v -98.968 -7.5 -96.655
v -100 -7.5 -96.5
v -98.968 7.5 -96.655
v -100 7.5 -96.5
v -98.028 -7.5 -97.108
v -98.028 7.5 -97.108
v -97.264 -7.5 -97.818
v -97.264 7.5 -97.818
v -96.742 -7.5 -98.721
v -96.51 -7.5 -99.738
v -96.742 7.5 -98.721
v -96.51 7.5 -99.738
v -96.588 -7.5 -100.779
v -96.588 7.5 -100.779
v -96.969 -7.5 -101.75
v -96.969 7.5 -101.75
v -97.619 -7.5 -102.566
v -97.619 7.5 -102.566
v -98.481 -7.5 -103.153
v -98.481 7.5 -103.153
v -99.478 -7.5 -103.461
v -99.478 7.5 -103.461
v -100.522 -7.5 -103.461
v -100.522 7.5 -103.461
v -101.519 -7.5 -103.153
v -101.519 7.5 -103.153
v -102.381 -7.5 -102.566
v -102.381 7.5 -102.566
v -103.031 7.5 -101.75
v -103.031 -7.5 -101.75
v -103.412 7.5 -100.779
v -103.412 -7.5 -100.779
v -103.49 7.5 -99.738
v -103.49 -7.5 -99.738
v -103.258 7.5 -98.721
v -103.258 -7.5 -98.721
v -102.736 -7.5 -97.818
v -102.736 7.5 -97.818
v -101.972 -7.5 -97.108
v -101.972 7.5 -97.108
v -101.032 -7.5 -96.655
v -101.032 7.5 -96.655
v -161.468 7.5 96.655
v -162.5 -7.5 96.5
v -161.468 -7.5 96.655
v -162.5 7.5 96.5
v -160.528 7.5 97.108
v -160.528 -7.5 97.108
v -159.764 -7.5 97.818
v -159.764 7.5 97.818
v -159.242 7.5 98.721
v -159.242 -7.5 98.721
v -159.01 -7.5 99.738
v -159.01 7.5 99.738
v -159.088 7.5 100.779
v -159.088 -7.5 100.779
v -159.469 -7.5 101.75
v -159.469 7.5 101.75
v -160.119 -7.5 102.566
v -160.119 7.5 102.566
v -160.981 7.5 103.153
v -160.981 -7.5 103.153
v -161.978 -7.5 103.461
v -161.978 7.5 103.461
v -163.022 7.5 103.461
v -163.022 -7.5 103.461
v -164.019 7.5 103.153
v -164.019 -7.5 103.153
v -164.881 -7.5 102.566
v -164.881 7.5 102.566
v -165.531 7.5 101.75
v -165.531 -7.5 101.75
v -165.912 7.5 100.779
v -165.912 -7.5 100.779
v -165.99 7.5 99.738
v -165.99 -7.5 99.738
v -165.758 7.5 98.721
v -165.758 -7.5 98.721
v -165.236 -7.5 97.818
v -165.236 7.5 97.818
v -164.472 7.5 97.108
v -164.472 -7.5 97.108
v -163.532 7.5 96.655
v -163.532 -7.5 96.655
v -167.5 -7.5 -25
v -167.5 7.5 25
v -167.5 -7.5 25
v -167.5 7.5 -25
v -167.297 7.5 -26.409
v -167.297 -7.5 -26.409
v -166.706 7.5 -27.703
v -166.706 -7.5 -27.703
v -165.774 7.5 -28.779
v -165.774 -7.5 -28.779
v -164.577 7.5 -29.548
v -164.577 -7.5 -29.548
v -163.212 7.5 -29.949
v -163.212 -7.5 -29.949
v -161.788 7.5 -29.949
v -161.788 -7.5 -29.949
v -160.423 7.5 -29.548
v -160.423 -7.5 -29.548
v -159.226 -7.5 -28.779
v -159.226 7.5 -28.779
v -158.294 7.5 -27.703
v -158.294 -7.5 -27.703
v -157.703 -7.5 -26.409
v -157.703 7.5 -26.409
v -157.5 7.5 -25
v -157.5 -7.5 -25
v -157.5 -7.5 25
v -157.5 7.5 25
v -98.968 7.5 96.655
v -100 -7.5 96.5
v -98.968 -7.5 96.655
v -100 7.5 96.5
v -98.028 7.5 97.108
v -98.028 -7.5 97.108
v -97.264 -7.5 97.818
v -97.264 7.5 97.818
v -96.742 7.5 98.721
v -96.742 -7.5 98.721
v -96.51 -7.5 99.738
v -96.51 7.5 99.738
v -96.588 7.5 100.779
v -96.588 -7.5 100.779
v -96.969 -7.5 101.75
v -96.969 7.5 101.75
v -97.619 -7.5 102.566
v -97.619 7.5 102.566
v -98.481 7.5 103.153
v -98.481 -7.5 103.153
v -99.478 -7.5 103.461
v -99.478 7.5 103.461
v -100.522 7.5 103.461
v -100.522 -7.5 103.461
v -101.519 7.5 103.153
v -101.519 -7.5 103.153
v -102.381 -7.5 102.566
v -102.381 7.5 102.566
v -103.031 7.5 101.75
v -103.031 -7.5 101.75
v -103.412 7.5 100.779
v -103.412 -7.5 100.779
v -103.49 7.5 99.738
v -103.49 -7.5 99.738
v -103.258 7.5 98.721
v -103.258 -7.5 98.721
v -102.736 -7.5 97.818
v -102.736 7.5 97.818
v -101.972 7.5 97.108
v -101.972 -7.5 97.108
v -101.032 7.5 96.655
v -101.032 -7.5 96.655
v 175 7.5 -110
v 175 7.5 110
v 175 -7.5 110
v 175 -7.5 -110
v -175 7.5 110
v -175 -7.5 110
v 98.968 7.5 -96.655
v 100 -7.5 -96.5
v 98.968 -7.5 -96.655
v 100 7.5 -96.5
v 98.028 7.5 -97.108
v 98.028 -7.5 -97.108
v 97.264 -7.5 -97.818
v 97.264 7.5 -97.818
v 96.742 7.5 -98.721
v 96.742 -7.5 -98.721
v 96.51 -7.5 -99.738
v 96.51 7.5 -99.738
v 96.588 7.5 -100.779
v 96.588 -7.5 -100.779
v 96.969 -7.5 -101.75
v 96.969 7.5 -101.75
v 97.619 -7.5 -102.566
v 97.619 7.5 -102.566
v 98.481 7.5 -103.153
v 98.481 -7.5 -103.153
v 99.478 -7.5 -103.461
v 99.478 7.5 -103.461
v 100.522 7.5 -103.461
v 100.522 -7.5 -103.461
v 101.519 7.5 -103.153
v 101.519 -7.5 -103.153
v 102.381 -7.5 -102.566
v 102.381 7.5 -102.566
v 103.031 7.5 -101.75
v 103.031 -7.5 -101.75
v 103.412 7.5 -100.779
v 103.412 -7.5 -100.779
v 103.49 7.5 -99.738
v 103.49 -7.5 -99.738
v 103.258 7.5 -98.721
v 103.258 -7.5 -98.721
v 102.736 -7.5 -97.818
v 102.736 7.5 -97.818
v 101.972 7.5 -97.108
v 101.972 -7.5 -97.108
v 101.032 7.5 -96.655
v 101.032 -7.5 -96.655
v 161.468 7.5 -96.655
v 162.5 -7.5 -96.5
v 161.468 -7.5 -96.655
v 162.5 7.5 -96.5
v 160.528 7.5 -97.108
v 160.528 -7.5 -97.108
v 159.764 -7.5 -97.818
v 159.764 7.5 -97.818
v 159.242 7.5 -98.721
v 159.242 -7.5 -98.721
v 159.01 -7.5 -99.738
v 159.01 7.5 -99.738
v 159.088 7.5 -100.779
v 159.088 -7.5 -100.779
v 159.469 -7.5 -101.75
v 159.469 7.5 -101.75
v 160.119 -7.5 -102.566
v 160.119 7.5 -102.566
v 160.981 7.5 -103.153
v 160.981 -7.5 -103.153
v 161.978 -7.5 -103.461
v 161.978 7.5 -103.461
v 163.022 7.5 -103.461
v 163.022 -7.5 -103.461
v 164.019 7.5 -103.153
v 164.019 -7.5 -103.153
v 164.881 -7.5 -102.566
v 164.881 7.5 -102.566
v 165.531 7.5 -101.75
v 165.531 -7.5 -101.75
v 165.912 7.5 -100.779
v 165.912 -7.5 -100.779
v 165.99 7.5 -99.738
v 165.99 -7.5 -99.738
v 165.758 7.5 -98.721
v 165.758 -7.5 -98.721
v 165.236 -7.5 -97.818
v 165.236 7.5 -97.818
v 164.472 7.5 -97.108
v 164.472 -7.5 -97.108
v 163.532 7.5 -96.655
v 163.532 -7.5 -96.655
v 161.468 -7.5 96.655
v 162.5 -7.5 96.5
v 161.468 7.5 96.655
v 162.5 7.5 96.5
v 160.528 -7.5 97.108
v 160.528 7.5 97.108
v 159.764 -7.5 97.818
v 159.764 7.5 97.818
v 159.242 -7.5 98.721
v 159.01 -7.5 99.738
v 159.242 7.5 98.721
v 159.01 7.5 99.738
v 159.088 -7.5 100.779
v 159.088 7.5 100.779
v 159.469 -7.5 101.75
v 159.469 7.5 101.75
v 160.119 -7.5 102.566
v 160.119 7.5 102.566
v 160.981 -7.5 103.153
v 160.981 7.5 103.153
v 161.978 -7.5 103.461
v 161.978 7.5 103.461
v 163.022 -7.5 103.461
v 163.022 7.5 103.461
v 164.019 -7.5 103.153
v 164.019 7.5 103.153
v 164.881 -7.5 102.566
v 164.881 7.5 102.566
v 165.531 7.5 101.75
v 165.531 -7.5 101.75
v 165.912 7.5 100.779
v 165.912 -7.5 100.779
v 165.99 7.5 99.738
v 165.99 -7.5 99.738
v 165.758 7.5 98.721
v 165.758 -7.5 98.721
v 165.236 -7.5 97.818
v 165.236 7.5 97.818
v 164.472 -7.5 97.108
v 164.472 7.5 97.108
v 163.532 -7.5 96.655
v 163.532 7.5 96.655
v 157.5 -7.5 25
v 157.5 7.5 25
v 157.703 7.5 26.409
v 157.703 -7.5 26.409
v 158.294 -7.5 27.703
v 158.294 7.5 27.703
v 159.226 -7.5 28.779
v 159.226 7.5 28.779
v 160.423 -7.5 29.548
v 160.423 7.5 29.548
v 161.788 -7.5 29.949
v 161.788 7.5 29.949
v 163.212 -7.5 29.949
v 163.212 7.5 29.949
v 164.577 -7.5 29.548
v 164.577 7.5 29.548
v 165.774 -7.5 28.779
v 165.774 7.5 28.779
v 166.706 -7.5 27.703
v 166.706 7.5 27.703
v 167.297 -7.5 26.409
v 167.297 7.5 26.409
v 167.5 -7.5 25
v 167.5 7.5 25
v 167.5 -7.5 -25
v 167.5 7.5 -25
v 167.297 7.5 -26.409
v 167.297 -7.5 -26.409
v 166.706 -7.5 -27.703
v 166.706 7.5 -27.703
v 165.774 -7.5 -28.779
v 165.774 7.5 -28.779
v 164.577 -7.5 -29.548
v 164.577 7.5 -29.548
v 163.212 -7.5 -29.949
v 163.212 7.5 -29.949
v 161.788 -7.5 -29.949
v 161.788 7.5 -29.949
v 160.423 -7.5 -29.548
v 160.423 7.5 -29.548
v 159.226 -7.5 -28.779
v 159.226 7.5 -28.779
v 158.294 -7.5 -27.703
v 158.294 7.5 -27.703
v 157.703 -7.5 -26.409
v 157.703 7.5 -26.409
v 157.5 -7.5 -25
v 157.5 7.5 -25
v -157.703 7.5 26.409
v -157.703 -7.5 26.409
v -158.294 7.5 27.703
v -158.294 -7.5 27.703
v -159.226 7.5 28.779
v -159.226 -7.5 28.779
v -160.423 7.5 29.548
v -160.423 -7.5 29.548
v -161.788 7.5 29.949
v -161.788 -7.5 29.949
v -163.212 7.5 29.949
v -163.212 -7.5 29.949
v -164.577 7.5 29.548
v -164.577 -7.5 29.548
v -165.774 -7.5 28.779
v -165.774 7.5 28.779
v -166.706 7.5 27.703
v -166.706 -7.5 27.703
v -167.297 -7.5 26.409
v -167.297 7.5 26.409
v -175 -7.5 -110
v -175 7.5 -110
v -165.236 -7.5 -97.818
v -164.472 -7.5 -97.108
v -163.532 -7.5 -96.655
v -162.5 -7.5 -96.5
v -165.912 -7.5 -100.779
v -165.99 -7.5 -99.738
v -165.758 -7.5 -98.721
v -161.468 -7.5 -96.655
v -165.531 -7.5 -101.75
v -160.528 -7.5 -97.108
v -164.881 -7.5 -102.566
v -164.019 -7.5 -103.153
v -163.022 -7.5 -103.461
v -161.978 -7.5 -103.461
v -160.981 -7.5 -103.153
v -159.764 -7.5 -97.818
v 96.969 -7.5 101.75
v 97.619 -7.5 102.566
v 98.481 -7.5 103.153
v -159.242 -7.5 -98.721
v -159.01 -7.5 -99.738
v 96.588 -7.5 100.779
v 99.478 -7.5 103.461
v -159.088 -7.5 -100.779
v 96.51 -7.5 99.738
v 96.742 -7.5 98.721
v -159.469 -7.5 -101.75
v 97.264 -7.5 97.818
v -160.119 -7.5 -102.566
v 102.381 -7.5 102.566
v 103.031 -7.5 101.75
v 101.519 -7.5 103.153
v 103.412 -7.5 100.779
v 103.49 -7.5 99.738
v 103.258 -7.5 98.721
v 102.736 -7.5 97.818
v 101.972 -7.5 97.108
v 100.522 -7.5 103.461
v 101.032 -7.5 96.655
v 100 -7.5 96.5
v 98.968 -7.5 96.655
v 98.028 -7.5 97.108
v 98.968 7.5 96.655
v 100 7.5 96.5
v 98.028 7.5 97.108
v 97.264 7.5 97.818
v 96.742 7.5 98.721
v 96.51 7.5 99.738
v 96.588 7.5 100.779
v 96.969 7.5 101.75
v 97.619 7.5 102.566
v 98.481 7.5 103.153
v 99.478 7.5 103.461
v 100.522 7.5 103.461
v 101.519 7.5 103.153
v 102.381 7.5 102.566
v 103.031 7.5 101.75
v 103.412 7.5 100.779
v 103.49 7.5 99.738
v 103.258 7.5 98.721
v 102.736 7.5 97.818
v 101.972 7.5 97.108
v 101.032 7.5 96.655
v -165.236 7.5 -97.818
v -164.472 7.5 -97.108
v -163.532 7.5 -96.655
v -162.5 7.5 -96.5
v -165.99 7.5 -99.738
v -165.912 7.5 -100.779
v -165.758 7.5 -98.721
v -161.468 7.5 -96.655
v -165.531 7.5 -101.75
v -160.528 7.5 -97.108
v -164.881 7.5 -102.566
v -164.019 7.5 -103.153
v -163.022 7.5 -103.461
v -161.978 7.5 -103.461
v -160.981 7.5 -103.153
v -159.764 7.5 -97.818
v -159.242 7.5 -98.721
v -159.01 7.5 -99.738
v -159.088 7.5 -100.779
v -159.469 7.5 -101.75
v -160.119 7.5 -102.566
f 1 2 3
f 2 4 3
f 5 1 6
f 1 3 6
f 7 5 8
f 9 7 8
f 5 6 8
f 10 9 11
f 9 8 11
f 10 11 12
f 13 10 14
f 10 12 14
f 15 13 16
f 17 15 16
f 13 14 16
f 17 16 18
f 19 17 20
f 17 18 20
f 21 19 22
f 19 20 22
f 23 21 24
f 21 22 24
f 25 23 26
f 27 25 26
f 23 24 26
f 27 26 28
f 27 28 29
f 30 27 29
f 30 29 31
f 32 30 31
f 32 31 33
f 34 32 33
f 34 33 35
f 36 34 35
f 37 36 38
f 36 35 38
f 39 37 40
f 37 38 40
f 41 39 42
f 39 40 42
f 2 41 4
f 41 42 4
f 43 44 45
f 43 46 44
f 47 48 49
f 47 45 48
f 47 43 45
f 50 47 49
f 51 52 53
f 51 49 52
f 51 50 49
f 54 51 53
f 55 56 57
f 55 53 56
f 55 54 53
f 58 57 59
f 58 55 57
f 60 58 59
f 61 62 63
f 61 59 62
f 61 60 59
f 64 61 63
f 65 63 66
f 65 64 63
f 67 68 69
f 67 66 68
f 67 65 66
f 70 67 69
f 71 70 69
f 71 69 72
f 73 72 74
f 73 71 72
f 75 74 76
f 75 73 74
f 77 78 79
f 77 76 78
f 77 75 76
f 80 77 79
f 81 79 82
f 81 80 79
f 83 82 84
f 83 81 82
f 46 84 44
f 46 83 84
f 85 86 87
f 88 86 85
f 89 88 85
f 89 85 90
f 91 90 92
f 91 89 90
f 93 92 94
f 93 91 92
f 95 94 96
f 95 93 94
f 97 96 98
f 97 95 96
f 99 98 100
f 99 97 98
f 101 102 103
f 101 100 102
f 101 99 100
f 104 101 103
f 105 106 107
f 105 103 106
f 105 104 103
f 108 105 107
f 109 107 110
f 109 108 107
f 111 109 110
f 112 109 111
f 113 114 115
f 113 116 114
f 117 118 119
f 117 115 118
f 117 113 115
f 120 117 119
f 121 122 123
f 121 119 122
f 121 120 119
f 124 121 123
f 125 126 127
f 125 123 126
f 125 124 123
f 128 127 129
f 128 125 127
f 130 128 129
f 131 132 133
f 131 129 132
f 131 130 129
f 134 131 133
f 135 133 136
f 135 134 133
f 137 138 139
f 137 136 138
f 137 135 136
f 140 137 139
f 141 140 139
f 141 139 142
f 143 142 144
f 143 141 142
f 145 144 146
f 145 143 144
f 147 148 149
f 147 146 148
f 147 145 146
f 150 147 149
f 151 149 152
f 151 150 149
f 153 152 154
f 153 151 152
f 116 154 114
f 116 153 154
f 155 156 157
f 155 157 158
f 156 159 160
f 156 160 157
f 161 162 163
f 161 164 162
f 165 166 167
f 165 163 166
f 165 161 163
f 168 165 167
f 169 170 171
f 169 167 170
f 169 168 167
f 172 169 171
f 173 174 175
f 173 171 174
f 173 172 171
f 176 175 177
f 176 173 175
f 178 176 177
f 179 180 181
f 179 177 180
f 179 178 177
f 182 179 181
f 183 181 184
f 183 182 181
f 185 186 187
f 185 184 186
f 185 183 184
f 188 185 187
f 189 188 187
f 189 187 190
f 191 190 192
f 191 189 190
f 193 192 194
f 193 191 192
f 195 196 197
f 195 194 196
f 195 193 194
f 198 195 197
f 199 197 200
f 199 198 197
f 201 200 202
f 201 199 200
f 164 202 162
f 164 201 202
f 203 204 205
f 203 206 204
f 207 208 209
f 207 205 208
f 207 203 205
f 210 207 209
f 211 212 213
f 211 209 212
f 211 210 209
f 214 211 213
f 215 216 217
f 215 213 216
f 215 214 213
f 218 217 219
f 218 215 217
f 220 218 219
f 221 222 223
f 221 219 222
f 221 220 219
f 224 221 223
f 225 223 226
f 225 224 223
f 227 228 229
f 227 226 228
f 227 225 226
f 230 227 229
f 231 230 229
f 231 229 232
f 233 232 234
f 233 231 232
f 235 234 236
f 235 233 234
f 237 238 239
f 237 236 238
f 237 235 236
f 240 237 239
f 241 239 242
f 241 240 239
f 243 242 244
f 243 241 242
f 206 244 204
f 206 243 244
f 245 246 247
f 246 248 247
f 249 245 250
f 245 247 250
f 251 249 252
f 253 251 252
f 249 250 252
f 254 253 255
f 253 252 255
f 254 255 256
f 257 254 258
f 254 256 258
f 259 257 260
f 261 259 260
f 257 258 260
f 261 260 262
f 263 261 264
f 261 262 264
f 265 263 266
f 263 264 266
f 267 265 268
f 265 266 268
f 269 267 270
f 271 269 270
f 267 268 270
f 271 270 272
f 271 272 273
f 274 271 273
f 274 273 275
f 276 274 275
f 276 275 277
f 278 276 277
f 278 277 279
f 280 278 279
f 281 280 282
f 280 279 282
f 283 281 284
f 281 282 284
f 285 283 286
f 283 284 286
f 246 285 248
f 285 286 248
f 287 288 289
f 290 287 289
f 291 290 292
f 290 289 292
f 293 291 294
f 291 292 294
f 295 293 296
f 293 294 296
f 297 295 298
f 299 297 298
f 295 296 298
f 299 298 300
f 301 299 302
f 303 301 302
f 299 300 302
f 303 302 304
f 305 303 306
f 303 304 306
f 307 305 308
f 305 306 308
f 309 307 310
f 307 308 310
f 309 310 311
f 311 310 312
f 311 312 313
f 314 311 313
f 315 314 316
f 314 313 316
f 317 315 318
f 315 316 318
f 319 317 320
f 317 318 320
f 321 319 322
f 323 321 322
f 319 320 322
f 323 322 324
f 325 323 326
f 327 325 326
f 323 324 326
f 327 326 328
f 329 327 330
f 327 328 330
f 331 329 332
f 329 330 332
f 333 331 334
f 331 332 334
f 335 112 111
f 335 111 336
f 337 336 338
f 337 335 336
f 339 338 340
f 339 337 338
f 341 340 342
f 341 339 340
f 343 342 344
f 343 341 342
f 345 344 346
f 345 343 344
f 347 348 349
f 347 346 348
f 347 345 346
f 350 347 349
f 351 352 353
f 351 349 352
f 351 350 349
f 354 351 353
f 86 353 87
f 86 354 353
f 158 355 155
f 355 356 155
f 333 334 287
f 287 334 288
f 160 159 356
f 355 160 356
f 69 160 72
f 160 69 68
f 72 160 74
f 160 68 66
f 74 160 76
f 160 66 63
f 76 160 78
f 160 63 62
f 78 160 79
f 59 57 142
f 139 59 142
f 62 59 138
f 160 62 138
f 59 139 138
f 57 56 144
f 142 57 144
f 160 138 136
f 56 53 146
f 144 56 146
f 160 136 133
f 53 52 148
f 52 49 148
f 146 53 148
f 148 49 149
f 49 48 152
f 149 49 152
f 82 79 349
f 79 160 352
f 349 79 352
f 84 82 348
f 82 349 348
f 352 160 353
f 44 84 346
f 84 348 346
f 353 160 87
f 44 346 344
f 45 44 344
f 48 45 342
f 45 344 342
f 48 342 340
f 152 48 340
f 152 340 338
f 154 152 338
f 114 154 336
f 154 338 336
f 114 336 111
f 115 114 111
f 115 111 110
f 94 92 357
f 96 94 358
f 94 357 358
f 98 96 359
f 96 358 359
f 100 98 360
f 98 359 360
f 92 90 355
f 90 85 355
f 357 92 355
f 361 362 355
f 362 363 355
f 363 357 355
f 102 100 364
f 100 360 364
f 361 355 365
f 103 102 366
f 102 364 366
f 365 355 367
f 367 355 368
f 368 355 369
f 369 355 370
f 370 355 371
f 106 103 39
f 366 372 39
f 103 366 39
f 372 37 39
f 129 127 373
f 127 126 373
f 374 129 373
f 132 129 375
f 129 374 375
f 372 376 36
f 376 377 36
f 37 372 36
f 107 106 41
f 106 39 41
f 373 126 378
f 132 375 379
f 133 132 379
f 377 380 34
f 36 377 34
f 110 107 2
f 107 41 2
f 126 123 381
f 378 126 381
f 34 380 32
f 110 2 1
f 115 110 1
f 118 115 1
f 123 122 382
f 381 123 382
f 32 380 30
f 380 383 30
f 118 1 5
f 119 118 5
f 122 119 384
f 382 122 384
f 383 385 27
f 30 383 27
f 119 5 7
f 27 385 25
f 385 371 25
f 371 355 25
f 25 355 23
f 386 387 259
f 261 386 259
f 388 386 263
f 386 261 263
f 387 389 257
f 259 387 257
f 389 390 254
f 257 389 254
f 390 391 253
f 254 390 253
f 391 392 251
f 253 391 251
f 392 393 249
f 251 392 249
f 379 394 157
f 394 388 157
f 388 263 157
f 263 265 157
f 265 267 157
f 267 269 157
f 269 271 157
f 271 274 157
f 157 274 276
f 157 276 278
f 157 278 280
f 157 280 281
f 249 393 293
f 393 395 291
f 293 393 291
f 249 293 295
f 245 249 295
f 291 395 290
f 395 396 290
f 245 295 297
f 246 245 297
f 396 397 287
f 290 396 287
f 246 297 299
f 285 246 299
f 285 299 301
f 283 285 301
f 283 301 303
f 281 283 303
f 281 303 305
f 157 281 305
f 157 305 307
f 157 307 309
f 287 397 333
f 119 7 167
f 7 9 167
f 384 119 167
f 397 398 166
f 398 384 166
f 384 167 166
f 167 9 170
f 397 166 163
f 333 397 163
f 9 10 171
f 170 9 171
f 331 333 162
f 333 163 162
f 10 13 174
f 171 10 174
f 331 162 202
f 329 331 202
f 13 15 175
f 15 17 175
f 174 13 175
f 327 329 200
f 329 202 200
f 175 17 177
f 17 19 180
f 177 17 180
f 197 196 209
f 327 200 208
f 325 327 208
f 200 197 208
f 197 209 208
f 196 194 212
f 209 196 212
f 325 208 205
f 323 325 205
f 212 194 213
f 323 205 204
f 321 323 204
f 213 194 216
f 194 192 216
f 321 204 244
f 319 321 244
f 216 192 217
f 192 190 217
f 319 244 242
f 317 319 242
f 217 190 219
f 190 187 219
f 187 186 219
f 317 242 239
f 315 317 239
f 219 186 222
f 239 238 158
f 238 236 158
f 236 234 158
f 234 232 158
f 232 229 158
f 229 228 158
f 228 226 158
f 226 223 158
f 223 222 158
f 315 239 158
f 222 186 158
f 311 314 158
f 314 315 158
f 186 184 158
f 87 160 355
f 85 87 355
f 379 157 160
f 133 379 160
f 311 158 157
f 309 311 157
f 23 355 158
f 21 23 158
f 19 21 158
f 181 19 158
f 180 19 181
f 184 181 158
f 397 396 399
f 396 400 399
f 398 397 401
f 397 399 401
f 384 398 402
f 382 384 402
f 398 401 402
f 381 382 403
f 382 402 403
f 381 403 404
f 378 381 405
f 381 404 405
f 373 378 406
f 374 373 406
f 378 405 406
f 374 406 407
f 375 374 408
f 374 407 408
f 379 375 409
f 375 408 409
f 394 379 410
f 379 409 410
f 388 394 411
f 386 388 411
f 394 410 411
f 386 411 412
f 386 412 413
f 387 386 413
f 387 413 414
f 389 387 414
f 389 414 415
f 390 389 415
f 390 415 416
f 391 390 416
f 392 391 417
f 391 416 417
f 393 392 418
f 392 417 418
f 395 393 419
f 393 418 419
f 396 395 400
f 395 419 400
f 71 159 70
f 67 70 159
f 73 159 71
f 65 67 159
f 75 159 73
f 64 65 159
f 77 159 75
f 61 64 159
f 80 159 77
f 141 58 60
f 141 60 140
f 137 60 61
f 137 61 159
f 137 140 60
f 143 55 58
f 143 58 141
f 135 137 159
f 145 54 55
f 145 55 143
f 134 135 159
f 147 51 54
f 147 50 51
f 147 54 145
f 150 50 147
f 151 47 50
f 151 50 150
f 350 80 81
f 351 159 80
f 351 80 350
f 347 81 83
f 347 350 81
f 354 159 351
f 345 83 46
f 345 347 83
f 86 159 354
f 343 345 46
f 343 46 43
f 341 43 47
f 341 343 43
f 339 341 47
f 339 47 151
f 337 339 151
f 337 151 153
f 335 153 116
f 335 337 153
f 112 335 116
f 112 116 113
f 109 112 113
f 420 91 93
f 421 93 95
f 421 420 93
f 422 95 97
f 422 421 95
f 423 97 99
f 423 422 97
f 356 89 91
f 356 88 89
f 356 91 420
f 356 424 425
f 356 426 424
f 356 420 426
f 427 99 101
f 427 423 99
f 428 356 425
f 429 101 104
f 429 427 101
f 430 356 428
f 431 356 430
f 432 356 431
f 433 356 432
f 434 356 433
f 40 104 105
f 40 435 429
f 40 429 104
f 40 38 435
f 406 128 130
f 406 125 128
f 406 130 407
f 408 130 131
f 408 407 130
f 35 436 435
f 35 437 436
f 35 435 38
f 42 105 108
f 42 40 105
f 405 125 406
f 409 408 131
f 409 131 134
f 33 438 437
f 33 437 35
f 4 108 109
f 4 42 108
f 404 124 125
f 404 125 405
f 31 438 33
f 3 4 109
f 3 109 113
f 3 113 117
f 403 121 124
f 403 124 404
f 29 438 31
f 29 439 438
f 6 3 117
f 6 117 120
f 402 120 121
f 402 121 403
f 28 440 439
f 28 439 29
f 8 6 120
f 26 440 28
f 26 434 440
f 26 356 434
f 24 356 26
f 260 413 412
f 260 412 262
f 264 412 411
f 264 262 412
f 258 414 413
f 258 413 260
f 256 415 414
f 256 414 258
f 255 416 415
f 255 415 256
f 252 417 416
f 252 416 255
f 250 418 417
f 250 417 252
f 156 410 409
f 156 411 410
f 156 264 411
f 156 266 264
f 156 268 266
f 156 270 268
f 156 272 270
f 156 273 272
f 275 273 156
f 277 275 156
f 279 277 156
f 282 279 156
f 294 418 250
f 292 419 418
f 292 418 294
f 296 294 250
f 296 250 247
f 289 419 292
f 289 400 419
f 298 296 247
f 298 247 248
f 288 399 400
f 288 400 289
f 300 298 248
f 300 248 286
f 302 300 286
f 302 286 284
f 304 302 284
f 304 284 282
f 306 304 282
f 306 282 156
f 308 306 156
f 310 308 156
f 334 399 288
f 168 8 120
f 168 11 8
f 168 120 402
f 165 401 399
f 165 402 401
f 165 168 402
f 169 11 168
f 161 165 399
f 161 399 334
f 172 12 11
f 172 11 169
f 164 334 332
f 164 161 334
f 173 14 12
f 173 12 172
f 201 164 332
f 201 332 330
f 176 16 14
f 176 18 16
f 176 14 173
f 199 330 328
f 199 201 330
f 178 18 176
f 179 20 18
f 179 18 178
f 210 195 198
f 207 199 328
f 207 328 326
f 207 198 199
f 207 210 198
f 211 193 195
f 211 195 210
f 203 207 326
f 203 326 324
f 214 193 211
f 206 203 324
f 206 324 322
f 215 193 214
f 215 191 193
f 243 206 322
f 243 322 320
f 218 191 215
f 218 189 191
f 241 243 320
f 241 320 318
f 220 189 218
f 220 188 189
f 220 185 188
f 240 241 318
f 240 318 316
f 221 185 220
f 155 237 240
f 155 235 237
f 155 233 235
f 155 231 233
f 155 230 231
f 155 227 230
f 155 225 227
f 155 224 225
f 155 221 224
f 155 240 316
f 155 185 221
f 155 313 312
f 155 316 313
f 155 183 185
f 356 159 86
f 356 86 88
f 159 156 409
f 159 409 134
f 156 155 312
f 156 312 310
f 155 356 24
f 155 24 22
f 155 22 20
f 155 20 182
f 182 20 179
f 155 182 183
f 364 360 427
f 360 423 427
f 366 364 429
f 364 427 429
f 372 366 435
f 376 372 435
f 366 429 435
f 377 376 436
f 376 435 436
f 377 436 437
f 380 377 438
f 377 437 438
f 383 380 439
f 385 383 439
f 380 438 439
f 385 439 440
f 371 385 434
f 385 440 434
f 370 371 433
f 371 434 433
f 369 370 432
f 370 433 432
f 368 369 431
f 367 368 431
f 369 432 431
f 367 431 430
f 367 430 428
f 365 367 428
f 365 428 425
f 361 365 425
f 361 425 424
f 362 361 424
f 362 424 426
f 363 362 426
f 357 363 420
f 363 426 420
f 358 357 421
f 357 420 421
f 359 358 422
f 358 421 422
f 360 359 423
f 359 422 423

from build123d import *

# Parameters (mm, degrees)
SKETCH1_W               = 350
SKETCH1_H               = 220
BOSS_EXTRUDE1_DEPTH     = 7.5
SKETCH2_R               = 3.5
CUT_EXTRUDE1_DEPTH      = 208.243817761
MIRROR2_COPY_1_SKETCH_R = 3.5
MIRROR2_COPY_1_DEPTH    = 208.243817761
CUT_EXTRUDE2_DEPTH      = 208.243817761
SKETCH4_R               = 3.5
CUT_EXTRUDE5_DEPTH      = 208.243817761
MIRROR4_COPY_1_SKETCH_R = 3.5
MIRROR4_COPY_1_DEPTH    = 208.243817761


with BuildPart() as part:
    # Sketch1 → Boss-Extrude1 (new, symmetric)
    with BuildSketch(Plane(origin=(0, 0, 0), x_dir=(1, 0, 0), z_dir=(0, 1, 0))):
        Rectangle(SKETCH1_W, SKETCH1_H)
    extrude(amount=BOSS_EXTRUDE1_DEPTH, both=True)

    # Sketch2 → Cut-Extrude1 (cut, symmetric)
    with BuildSketch(Plane(origin=(0, 7.5, 0), x_dir=(1, 0, 0), z_dir=(0, 1, 0))):
        with Locations(Location((-100, 100, 0), (0, 0, 270))):
            Circle(SKETCH2_R)
    cut_extrude1 = extrude(amount=CUT_EXTRUDE1_DEPTH, both=True, mode=Mode.SUBTRACT)

    # Mirror1: Cut-Extrude1 across plane
    add(cut_extrude1.mirror(Plane.XY), mode=Mode.SUBTRACT)

    # Mirror2: Cut-Extrude1 across plane
    add(cut_extrude1.mirror(Plane(origin=(0, 0, 0), x_dir=(0, 0, 1), z_dir=(1, 0, 0))), mode=Mode.SUBTRACT)

    # Mirror2 copy 1 sketch → Mirror2 copy 1 (cut, symmetric)
    with BuildSketch(Plane(origin=(0, 7.5, 0), x_dir=(-1, 0, 0), z_dir=(0, 1, 0))):
        with Locations(Location((-100, 100, 0), (0, 0, 270))):
            Circle(MIRROR2_COPY_1_SKETCH_R)
    extrude(amount=MIRROR2_COPY_1_DEPTH, both=True, mode=Mode.SUBTRACT)

    # Sketch3 → Cut-Extrude2 (cut, symmetric)
    with BuildSketch(Plane(origin=(0, 7.5, 0), x_dir=(1, 0, 0), z_dir=(0, 1, 0))):
        with BuildLine():
            Line((-167.5, -25), (-167.5, 25))
            ThreePointArc((-167.5, 25), (-162.5, 30), (-157.5, 25))
            Line((-157.5, 25), (-157.5, -25))
            ThreePointArc((-157.5, -25), (-162.5, -30), (-167.5, -25))
        make_face()
    cut_extrude2 = extrude(amount=CUT_EXTRUDE2_DEPTH, both=True, mode=Mode.SUBTRACT)

    # Sketch4 → Cut-Extrude5 (cut, symmetric)
    with BuildSketch(Plane(origin=(0, 7.5, 0), x_dir=(1, 0, 0), z_dir=(0, 1, 0))):
        with Locations(Location((-162.5, 100, 0), (0, 0, 270))):
            Circle(SKETCH4_R)
    cut_extrude5 = extrude(amount=CUT_EXTRUDE5_DEPTH, both=True, mode=Mode.SUBTRACT)

    # Mirror3: Cut-Extrude5 across plane
    add(cut_extrude5.mirror(Plane.XY), mode=Mode.SUBTRACT)

    # Mirror4: Cut-Extrude5 across plane
    add(cut_extrude5.mirror(Plane(origin=(0, 0, 0), x_dir=(0, 0, 1), z_dir=(1, 0, 0))), mode=Mode.SUBTRACT)

    # Mirror4 copy 1 sketch → Mirror4 copy 1 (cut, symmetric)
    with BuildSketch(Plane(origin=(0, 7.5, 0), x_dir=(-1, 0, 0), z_dir=(0, 1, 0))):
        with Locations(Location((-162.5, 100, 0), (0, 0, 270))):
            Circle(MIRROR4_COPY_1_SKETCH_R)
    extrude(amount=MIRROR4_COPY_1_DEPTH, both=True, mode=Mode.SUBTRACT)

    # Mirror5: Cut-Extrude2 across plane
    add(cut_extrude2.mirror(Plane(origin=(0, 0, 0), x_dir=(0, 0, 1), z_dir=(1, 0, 0))), mode=Mode.SUBTRACT)


solid = part.part
